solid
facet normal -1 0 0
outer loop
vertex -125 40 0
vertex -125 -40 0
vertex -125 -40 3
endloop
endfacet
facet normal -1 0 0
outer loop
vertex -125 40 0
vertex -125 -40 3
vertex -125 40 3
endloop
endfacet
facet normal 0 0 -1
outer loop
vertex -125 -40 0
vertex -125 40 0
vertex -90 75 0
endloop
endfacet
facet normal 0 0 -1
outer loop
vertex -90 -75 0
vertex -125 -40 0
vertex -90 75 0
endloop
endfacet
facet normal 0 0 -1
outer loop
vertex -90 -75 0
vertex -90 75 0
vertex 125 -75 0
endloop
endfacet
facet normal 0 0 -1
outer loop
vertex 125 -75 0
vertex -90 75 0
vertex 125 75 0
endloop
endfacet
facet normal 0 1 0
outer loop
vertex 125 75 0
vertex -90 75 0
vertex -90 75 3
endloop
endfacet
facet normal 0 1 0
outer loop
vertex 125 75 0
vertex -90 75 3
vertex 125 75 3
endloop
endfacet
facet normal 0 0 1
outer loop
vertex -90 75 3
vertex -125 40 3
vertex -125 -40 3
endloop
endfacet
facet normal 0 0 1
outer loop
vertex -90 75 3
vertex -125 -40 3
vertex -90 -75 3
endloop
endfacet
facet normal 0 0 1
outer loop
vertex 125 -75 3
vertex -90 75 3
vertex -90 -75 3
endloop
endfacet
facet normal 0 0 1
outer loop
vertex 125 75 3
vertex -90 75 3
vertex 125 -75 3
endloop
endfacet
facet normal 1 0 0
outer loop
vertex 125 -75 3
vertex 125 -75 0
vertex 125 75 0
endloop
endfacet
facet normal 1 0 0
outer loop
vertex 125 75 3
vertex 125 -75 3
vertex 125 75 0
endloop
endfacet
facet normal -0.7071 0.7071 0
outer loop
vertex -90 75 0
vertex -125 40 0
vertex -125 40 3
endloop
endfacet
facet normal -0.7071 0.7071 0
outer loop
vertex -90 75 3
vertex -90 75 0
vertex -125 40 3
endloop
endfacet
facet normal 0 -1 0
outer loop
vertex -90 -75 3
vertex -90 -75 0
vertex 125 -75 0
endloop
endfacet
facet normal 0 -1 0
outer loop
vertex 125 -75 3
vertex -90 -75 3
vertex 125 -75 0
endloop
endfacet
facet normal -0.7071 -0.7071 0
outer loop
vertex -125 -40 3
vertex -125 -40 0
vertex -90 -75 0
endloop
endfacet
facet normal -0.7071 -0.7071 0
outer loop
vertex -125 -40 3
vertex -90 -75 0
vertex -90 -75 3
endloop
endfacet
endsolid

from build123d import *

# Parameters (mm, degrees)
SKETCH1_W           = 250
SKETCH1_H           = 150
BOSS_EXTRUDE1_DEPTH = 3
CHAMFER3_SIZE       = 35


with BuildPart() as part:
    # Sketch1 → Boss-Extrude1 (new body)
    with BuildSketch(Plane.XY):
        Rectangle(SKETCH1_W, SKETCH1_H)
    extrude(amount=BOSS_EXTRUDE1_DEPTH)

    # Chamfer3
    chamfer3_edges = [part.edges().sort_by_distance(p)[0] for p in [
        (-125, -75, 1.5),
        (-125, 75, 1.5),
    ]]
    chamfer(chamfer3_edges, length=CHAMFER3_SIZE)


solid = part.part
